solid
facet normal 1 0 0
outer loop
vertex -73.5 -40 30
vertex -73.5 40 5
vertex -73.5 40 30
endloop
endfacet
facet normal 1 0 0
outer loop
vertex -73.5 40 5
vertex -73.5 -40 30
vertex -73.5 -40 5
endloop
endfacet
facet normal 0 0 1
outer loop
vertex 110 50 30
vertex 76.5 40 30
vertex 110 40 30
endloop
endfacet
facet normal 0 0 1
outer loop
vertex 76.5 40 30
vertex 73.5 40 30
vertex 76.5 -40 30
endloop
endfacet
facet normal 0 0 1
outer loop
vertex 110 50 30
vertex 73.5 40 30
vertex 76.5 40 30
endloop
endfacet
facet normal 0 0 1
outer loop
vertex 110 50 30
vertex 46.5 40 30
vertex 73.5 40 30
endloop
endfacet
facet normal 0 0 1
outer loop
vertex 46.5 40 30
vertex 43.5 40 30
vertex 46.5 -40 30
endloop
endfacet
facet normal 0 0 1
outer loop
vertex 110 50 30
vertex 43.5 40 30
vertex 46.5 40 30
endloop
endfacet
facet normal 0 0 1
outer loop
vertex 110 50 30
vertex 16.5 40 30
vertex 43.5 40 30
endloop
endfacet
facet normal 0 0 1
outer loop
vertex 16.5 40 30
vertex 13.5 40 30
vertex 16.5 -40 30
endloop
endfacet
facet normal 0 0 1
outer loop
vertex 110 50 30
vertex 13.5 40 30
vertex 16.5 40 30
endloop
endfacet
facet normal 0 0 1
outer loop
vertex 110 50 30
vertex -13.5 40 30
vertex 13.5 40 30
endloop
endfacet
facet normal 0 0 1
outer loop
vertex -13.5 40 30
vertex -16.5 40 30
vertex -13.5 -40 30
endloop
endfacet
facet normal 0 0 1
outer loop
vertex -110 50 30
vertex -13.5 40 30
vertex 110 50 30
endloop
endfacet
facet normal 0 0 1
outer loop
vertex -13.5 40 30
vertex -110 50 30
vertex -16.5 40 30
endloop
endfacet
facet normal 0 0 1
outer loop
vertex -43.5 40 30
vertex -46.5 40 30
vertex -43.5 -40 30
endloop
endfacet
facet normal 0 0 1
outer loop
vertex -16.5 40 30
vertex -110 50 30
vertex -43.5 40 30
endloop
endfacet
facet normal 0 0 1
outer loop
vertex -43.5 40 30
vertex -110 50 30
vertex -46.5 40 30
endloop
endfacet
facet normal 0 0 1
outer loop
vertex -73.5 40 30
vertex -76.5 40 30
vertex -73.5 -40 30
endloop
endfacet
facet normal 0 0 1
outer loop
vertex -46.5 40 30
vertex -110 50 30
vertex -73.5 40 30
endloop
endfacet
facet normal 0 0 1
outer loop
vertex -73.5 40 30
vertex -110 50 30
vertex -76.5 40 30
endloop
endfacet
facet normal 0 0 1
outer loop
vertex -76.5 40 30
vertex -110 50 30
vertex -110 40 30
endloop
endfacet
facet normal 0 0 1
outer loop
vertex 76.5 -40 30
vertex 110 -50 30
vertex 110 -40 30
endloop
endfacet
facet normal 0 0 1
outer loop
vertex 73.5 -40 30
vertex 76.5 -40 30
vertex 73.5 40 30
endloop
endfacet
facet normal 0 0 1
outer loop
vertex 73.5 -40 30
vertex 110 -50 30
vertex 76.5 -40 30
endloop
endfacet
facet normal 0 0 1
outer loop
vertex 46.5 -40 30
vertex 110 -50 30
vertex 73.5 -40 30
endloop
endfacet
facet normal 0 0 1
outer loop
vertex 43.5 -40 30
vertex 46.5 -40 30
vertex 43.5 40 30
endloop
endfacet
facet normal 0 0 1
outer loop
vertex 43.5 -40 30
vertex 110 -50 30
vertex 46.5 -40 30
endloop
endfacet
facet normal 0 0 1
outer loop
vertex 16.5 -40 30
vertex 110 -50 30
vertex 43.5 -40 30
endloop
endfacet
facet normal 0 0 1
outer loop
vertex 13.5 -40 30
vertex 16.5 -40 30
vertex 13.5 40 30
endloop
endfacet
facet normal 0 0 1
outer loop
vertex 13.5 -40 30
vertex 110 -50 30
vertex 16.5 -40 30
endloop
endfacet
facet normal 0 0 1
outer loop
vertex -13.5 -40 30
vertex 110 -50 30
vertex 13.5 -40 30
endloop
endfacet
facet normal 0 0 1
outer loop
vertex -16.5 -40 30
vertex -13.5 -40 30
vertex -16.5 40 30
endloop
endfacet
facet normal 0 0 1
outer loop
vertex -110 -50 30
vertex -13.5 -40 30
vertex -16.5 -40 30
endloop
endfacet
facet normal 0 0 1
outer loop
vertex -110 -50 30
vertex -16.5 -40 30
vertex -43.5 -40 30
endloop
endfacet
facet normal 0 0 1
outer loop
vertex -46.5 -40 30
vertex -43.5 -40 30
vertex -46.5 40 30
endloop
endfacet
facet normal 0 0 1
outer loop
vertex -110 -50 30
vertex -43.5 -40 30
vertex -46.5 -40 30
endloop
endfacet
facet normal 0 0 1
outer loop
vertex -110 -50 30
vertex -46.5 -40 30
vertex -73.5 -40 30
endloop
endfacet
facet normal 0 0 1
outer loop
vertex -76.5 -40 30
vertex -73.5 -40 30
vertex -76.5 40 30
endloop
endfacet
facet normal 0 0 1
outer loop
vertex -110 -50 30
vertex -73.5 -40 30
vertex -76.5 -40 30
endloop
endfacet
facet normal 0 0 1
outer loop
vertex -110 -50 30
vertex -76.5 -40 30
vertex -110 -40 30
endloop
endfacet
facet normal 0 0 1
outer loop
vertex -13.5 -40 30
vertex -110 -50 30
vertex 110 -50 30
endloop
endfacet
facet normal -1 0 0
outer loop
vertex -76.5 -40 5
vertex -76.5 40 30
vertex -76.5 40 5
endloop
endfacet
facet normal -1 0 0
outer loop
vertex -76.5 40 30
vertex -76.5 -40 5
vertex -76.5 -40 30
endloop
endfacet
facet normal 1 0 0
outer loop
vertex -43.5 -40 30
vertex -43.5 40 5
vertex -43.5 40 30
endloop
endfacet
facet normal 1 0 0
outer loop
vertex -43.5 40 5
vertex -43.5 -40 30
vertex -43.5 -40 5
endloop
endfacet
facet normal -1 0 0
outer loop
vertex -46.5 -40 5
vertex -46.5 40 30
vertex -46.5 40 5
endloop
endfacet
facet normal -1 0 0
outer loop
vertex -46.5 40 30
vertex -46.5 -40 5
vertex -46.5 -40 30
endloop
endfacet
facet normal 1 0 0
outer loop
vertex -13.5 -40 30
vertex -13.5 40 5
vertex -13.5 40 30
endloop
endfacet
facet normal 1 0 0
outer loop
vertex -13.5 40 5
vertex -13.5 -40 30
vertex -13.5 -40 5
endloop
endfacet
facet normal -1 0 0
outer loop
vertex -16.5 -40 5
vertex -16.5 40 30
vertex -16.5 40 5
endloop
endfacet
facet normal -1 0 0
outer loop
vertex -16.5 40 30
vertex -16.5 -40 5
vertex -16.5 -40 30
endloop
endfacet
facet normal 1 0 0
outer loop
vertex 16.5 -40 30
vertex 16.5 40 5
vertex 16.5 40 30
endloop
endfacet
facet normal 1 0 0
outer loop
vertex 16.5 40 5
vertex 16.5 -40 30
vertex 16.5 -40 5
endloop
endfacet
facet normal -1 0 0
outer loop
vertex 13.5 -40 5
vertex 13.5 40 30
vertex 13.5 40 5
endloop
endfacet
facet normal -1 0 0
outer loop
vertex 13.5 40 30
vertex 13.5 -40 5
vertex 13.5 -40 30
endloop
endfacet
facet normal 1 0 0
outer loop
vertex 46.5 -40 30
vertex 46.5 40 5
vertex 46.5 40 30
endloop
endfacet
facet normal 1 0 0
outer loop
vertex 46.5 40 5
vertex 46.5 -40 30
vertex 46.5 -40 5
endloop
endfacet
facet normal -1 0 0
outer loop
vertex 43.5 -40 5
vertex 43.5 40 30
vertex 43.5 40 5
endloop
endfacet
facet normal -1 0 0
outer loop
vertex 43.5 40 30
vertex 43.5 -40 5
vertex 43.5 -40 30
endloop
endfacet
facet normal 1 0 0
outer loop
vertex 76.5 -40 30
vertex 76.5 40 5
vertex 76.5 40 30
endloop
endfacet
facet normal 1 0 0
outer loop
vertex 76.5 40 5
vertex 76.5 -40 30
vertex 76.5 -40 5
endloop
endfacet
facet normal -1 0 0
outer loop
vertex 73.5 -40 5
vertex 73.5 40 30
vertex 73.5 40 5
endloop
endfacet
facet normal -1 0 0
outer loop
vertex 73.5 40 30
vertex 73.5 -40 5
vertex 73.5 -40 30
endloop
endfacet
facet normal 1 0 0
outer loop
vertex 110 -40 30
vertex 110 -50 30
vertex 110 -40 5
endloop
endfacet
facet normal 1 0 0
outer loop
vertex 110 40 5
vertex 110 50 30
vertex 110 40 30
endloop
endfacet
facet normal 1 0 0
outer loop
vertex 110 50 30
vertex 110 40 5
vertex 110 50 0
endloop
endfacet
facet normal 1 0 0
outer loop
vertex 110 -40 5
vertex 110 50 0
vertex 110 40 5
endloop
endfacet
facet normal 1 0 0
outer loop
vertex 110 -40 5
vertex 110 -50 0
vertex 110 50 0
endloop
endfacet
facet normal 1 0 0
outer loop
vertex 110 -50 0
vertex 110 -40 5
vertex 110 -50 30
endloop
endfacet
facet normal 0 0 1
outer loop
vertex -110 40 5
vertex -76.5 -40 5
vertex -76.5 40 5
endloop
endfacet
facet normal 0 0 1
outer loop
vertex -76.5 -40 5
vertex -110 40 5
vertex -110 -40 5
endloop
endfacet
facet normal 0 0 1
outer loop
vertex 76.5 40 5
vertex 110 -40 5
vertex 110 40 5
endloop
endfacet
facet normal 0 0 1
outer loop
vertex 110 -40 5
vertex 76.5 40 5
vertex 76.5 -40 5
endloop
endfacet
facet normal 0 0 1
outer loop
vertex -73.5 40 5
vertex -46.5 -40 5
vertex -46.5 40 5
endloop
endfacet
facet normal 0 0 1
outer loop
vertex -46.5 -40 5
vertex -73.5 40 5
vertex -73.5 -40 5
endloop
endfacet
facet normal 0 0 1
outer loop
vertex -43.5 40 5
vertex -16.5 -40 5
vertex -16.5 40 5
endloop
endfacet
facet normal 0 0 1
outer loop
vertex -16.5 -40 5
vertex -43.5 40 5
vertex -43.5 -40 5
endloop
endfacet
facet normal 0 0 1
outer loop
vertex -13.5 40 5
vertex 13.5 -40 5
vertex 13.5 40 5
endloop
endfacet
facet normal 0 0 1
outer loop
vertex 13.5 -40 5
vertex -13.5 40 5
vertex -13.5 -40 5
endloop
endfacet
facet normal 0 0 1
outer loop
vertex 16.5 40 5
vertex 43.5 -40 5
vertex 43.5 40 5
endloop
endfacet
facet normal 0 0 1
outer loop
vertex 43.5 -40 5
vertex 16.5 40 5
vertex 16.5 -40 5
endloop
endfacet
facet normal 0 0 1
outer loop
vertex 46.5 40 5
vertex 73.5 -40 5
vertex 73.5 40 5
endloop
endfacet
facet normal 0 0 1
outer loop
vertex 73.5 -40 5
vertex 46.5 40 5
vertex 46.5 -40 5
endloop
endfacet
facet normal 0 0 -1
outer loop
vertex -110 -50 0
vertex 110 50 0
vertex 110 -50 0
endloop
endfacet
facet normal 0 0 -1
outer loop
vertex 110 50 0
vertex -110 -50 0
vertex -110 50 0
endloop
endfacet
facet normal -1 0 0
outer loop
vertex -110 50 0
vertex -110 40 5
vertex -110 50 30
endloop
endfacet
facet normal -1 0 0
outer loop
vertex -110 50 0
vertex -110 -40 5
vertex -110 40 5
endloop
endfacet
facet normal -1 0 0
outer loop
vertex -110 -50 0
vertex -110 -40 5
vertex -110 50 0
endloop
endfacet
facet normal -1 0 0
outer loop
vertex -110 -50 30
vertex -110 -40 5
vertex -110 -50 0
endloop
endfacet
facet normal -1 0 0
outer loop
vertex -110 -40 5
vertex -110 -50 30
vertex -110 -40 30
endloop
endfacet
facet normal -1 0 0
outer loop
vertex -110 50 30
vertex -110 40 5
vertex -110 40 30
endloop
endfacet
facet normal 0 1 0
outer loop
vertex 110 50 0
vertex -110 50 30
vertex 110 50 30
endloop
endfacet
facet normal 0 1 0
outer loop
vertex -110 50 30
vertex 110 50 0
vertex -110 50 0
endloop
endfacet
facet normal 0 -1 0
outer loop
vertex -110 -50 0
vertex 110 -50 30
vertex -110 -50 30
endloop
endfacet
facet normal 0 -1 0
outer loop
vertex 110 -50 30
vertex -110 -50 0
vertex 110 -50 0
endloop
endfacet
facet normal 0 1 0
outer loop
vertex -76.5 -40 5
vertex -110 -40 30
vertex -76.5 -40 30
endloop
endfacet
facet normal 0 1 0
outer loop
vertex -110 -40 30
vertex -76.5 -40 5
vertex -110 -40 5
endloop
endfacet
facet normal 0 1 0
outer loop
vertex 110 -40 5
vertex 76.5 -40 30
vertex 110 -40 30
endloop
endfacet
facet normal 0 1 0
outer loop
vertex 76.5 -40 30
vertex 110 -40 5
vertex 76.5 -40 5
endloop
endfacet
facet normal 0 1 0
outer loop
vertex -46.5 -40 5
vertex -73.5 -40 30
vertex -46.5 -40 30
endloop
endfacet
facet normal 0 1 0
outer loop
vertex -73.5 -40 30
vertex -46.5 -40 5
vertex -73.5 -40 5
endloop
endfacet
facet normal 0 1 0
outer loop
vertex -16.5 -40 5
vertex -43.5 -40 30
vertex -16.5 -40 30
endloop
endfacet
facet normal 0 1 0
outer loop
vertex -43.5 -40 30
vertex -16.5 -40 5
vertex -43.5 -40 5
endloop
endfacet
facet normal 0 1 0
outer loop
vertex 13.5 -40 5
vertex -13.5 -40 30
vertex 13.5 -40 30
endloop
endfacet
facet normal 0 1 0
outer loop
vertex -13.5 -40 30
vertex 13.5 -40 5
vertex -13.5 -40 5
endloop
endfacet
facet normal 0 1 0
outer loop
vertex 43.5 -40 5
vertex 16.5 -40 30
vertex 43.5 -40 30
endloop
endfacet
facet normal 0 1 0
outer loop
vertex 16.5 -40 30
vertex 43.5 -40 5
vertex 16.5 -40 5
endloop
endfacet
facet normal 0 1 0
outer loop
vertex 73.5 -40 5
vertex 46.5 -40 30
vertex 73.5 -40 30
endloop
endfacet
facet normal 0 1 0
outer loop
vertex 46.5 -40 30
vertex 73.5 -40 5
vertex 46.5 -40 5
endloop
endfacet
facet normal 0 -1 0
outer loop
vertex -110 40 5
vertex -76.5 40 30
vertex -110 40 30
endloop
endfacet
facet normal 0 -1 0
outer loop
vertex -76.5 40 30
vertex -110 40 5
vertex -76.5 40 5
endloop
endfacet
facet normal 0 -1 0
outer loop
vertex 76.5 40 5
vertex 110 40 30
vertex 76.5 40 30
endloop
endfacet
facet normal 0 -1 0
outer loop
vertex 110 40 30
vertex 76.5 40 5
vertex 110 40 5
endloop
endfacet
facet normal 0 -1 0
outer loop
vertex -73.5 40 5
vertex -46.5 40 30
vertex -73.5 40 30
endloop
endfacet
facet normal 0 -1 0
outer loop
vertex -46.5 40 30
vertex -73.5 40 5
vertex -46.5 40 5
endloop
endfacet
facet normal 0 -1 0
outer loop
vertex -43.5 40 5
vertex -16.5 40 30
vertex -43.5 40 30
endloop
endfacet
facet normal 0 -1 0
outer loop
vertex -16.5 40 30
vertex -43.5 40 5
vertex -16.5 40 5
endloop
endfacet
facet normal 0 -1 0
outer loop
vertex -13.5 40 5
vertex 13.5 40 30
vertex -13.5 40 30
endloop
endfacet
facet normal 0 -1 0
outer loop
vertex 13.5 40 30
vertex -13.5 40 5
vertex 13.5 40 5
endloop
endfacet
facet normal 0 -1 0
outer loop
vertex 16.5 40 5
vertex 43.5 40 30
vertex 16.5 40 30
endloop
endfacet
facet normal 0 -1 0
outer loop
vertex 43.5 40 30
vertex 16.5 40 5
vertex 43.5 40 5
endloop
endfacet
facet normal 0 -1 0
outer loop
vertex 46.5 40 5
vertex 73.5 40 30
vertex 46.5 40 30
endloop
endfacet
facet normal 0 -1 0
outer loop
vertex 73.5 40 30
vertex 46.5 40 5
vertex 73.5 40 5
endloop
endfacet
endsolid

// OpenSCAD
$fn = 32;

// ----------------------------------------------------------------------
// Rib frame 220 x 100 x 30
// 6 ribs at 30 mm pitch
// ----------------------------------------------------------------------

// --- parameters (mm) ---
frame = [220, 100, 5];  // base plate size (x, y, z)
rail_w = 10;            // side rail width
ribs = 6;               // number of ribs
rib_t = 3;              // rib thickness
rib_h = 25;             // rib height above the base plate
pitch = 30;             // pitch between rib centres

// --- derived feature positions (mm) ---
span = (ribs - 1) * pitch;          // = 150   distance between the outer ribs
origin_x = -span / 2;               // = -75   X of the first rib
rib_len = frame[1] - 2 * rail_w + 2;  // = 82   rib length, 1 mm into each rail
feature_centers = [
  [origin_x + 0 * pitch, 0],
  [origin_x + 1 * pitch, 0],
  [origin_x + 2 * pitch, 0],
  [origin_x + 3 * pitch, 0],
  [origin_x + 4 * pitch, 0],
  [origin_x + 5 * pitch, 0]
];   // rib centre line, drives the rib loop

// base plate, two side rails, then the ribs read straight off feature_centers
union() {
  translate([-frame[0] / 2, -frame[1] / 2, 0]) cube(frame);
  translate([-frame[0] / 2, -frame[1] / 2, 0]) cube([frame[0], rail_w, frame[2] + rib_h]);
  translate([-frame[0] / 2, frame[1] / 2 - rail_w, 0]) cube([frame[0], rail_w, frame[2] + rib_h]);
  for (centre = feature_centers)
    translate([centre[0] - rib_t / 2, centre[1] - rib_len / 2, frame[2] - 1])
      cube([rib_t, rib_len, rib_h + 1]);
}
